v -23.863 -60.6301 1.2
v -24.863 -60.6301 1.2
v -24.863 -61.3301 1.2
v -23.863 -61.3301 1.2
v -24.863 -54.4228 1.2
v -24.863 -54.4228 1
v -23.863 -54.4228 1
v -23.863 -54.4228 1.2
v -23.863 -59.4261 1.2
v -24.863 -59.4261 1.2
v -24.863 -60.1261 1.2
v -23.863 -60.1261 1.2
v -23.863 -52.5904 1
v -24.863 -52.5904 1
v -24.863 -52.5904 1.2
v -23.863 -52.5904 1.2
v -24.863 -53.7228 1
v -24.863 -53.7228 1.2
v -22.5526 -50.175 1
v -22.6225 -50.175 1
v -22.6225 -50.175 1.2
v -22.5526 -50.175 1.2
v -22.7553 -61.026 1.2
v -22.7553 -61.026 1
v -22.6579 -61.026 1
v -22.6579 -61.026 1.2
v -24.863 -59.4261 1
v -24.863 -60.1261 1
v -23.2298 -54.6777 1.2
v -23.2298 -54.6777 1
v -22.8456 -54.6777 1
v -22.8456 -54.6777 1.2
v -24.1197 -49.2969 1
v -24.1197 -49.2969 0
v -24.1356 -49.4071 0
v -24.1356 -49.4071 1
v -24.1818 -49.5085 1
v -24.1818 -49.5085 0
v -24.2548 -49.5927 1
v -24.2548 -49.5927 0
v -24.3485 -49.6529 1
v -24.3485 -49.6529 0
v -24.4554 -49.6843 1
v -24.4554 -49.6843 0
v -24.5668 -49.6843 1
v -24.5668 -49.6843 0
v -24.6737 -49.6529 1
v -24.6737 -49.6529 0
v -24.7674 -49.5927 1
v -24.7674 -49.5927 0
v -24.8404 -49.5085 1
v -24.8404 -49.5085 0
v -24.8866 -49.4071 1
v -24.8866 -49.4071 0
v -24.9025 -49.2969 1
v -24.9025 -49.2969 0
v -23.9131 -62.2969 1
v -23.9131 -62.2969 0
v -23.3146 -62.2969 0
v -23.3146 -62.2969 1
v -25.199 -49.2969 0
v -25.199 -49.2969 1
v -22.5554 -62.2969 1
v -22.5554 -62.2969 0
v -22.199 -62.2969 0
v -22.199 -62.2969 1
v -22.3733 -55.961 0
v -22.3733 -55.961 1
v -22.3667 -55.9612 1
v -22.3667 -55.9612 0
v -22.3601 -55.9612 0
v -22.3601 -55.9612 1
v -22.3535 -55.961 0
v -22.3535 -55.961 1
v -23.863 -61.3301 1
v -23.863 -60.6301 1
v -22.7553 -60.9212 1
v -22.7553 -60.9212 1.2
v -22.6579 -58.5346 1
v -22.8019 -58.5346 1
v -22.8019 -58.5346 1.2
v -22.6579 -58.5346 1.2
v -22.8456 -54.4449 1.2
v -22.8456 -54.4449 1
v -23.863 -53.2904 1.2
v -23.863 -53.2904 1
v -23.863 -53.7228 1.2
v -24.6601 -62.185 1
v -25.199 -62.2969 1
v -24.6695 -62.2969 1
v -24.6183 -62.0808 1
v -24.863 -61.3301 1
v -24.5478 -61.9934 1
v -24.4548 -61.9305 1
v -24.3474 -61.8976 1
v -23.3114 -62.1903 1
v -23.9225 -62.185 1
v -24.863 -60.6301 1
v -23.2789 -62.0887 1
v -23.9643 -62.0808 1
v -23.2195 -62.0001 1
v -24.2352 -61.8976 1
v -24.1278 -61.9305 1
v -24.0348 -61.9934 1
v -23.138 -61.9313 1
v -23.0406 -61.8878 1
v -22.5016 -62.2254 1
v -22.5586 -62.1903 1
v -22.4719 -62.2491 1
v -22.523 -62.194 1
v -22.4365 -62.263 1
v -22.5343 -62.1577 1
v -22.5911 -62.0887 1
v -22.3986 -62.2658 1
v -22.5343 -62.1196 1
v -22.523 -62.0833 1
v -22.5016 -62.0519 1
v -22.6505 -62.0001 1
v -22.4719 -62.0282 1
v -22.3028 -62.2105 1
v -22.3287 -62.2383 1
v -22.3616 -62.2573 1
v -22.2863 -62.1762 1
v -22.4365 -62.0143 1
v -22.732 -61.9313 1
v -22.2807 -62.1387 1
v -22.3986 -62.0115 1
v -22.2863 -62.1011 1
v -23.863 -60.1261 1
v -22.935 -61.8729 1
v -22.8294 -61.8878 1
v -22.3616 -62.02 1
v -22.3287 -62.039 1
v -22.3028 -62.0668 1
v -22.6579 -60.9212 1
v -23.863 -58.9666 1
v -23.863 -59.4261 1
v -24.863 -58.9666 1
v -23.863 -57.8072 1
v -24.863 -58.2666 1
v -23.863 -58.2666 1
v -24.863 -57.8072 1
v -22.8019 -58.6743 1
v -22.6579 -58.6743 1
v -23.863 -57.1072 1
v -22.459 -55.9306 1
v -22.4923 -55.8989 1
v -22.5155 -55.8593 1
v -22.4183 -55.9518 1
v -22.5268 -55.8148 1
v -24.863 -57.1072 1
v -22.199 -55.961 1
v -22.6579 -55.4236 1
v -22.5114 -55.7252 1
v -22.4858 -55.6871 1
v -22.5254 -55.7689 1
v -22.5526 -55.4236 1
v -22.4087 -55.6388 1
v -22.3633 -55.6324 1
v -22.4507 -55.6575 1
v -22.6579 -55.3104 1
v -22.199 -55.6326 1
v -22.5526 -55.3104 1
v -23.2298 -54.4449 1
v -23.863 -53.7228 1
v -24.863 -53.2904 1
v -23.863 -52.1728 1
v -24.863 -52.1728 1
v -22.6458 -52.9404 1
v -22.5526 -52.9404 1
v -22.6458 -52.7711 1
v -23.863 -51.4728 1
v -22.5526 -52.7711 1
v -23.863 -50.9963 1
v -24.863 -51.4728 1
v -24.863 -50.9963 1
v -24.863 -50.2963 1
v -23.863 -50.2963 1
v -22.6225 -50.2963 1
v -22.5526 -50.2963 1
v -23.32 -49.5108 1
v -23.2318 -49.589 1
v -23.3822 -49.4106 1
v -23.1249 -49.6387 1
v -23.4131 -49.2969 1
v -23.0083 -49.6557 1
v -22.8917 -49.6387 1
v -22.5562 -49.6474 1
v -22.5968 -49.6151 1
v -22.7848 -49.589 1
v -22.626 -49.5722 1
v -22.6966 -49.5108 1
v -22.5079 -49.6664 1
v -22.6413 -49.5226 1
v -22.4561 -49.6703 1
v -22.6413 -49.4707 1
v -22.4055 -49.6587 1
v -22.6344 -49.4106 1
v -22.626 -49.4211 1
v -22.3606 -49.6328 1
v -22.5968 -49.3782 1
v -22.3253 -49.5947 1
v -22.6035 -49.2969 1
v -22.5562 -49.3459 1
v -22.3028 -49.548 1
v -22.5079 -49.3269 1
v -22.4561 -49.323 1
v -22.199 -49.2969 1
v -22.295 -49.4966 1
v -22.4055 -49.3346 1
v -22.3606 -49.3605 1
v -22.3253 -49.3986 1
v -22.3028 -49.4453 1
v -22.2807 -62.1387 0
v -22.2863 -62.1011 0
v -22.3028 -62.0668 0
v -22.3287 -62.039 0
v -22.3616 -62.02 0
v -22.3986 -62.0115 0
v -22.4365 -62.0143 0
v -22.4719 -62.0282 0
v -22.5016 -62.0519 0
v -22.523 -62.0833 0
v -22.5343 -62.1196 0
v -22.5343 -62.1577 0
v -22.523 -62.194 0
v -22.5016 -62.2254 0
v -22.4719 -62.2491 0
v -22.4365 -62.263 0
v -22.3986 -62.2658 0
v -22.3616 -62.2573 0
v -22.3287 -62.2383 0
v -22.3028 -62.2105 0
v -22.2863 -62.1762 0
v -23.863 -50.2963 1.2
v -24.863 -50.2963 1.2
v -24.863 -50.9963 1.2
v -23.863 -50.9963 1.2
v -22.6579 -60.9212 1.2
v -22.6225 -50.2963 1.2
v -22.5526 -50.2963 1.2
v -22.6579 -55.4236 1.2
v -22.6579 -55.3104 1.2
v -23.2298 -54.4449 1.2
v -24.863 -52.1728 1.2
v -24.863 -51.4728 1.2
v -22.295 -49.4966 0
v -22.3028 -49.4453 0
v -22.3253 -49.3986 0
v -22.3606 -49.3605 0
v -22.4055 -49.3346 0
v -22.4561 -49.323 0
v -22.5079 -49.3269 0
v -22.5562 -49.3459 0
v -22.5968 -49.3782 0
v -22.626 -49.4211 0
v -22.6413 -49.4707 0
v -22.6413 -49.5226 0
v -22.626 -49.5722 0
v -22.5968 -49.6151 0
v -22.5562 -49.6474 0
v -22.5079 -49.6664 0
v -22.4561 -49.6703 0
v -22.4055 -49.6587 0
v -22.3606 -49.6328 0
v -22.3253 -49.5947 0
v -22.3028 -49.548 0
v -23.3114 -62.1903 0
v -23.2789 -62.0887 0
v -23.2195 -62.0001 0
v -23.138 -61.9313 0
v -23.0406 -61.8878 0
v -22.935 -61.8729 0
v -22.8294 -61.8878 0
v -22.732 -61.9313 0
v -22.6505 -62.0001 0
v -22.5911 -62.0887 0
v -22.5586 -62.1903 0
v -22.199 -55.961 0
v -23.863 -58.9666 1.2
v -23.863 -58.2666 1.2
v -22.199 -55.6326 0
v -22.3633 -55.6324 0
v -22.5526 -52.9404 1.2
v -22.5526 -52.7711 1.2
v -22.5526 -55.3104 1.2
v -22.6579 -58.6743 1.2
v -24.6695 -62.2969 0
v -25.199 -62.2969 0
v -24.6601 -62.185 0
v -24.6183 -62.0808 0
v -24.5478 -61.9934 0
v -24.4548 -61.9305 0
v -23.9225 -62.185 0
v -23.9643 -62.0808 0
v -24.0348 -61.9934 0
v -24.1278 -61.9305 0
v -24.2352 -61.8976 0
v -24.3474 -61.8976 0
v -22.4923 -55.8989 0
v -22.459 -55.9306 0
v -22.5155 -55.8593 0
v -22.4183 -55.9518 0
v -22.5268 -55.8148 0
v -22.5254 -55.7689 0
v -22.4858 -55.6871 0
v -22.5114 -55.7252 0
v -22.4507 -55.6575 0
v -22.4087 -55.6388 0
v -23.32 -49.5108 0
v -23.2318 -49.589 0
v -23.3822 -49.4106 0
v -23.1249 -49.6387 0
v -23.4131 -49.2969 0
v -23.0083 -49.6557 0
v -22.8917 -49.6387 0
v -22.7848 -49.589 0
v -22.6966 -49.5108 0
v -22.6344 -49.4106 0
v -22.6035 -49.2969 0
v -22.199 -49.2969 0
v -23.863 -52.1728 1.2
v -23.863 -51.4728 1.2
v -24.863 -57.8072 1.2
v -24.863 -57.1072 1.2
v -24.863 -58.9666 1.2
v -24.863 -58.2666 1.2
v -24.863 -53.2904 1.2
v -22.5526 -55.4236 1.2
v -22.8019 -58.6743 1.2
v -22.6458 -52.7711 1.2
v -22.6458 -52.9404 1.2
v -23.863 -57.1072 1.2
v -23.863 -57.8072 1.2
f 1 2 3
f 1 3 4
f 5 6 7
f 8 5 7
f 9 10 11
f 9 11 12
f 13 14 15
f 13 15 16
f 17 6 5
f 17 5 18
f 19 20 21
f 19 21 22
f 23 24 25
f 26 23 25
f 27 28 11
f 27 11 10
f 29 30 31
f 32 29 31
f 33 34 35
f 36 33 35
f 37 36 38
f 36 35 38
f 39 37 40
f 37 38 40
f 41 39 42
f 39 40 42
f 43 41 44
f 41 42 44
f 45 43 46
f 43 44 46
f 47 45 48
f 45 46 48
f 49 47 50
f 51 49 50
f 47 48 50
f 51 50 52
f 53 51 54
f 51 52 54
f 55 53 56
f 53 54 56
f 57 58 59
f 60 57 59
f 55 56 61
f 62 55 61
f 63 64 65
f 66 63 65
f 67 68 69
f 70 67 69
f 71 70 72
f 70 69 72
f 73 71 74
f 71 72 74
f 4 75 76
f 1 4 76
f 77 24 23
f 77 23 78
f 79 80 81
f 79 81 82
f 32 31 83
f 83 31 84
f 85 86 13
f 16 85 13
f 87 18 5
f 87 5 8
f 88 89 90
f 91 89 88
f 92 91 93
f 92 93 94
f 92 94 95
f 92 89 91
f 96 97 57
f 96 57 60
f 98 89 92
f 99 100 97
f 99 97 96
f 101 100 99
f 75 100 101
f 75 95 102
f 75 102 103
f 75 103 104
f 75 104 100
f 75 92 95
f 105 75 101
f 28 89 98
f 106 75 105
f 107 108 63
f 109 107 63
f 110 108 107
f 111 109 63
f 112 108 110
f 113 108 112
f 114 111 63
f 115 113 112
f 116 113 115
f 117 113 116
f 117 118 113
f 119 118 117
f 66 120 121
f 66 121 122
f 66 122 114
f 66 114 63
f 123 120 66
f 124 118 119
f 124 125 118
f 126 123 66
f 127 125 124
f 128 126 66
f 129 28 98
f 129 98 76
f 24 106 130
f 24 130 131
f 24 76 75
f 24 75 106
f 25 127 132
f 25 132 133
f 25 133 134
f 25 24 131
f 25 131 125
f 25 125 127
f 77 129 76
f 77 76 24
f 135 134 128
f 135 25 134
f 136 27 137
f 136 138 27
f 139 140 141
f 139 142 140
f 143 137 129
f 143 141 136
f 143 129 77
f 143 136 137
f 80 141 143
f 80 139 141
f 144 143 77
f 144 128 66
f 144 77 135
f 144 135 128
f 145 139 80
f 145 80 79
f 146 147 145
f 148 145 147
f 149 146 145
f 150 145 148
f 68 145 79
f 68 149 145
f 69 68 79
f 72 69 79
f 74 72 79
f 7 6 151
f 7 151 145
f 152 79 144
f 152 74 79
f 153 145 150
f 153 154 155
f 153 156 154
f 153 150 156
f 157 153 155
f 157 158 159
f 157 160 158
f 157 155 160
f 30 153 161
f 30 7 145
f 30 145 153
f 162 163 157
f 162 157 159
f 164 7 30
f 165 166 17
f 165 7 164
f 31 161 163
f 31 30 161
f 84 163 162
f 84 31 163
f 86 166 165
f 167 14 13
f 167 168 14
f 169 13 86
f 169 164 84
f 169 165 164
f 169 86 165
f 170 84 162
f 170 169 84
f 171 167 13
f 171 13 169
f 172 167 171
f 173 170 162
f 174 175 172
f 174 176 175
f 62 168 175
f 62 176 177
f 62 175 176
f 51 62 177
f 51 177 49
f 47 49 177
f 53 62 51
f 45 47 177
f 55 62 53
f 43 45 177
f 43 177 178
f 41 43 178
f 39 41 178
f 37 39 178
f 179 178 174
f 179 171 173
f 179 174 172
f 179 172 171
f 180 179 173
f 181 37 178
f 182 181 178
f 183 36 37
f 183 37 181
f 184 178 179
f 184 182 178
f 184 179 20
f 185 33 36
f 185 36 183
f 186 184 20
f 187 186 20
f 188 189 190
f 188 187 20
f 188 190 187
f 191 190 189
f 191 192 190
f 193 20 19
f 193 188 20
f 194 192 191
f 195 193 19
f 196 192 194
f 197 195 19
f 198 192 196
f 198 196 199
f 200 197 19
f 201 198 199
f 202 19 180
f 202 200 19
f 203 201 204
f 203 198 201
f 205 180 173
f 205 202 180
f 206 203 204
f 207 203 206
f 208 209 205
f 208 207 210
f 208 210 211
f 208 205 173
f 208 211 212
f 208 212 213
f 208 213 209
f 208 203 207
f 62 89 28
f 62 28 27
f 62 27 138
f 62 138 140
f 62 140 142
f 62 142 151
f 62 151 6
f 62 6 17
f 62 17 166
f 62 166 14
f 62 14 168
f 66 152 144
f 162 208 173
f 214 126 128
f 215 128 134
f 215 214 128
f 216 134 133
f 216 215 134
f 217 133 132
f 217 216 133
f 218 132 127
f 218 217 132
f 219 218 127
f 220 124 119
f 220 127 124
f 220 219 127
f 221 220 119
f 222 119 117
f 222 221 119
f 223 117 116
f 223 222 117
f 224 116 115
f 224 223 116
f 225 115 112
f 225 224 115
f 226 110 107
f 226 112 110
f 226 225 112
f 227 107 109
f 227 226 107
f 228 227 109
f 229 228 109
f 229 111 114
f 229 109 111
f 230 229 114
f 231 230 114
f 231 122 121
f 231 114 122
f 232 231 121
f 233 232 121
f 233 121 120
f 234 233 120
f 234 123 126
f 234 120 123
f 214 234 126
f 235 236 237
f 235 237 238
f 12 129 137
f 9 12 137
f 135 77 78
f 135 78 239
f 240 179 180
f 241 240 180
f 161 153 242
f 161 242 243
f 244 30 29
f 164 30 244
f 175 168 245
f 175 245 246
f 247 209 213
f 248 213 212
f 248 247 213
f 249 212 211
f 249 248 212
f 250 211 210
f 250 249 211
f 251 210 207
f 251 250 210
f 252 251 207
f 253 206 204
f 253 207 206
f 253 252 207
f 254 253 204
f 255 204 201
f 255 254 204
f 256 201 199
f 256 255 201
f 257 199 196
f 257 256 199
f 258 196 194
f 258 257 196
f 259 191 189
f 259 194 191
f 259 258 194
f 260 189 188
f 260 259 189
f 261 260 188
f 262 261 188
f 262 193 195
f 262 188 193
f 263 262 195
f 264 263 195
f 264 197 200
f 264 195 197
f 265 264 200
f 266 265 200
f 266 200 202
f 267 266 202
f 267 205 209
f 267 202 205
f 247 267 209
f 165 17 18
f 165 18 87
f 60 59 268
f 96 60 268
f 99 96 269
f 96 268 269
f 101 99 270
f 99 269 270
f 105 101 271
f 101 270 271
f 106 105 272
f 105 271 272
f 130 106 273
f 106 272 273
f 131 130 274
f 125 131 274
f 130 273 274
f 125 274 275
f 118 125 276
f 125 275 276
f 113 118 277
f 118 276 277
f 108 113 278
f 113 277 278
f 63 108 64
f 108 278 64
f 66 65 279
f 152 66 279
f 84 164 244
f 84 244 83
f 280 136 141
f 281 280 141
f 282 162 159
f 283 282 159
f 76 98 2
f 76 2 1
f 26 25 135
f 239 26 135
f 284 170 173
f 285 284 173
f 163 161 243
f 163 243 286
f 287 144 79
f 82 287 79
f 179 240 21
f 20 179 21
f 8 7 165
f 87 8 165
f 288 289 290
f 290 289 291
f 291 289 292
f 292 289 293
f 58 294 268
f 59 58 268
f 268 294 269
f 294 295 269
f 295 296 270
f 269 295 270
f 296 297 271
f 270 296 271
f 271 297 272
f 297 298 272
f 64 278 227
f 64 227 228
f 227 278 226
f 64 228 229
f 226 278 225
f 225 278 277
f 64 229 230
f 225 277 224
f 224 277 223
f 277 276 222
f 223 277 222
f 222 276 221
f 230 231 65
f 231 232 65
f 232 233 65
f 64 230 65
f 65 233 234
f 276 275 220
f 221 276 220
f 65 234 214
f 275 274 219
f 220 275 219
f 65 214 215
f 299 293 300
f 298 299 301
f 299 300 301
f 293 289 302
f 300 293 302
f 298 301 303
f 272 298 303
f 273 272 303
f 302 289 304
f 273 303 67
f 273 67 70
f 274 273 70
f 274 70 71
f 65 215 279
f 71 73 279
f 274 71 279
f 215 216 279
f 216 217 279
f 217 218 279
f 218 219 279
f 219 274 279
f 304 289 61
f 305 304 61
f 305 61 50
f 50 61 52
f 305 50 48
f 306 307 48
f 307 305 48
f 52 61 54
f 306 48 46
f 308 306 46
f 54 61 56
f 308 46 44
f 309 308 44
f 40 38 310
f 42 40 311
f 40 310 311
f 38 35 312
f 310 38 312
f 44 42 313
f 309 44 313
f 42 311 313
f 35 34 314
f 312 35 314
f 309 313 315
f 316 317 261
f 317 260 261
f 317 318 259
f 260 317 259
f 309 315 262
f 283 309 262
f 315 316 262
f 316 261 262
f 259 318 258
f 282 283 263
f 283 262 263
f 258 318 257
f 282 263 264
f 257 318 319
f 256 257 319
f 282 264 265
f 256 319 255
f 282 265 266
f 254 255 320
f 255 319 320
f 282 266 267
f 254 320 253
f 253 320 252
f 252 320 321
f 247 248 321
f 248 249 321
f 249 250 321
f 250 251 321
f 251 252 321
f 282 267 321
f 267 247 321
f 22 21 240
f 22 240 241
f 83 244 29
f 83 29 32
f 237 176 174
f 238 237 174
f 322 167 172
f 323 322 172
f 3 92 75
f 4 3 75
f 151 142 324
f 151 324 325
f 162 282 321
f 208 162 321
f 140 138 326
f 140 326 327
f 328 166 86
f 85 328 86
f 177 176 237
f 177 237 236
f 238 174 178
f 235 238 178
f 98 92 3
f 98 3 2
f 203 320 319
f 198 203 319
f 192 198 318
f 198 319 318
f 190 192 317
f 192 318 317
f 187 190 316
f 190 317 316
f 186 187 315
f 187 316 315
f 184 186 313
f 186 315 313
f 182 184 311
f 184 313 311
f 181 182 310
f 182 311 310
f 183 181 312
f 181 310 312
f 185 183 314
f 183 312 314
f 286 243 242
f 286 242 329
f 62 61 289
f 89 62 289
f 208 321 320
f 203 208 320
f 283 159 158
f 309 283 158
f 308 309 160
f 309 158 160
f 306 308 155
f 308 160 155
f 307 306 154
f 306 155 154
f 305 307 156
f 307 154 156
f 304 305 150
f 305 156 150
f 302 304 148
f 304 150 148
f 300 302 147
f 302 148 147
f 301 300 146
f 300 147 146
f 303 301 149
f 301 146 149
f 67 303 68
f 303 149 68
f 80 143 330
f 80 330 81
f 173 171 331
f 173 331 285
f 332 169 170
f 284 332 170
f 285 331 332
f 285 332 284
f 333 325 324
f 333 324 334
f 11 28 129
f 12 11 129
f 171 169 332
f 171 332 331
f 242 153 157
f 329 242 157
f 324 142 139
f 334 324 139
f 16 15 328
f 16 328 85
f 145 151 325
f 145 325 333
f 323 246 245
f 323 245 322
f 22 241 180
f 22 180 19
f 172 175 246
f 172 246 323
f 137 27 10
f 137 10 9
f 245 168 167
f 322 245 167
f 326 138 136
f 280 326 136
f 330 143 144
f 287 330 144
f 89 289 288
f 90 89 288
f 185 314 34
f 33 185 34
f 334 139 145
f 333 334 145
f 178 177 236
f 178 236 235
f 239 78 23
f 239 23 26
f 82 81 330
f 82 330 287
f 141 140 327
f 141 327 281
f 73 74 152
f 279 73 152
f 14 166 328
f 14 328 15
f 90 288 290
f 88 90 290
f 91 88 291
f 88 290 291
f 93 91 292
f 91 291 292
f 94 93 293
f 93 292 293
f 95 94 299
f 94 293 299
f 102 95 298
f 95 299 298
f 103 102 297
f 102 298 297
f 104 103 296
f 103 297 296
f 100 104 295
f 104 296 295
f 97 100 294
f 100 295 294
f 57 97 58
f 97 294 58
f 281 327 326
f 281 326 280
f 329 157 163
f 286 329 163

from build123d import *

# Parameters (mm, degrees)
F1_DEPTH = 1
F2_R     = 0.174096
F2_R_2   = 0.127508
F3_DEPTH = 1.001
F4_W     = 1
F4_H     = 0.7
F4_W_2   = 0.384185
F4_H_2   = 0.232839
F5_DEPTH = 0.2
F7_DEPTH = 1.001
F8_W     = 0.069853
F8_H     = 0.121337
F8_W_2   = 0.093136
F8_H_2   = 0.169292
F8_W_3   = 0.105232
F8_H_3   = 0.113234
F8_W_4   = 0.097446
F8_H_4   = 0.104777
F8_W_5   = 0.144014
F8_H_5   = 0.139706
F9_DEPTH = 0.2


with BuildPart() as f1:
    # F0 (on Top) → F1 (new body)
    with BuildSketch(Plane.XY):
        with BuildLine():
            Line((-24.902489, -49.29686), (-25.199003, -49.29686))
            Line((-25.199003, -49.29686), (-25.199003, -62.29686))
            Line((-25.199003, -62.29686), (-24.669482, -62.29686))
            ThreePointArc((-24.669482, -62.29686), (-24.2913, -61.893387), (-23.913119, -62.29686))
            Line((-23.913119, -62.29686), (-23.314611, -62.29686))
            ThreePointArc((-23.314611, -62.29686), (-22.93501, -61.872911), (-22.55541, -62.29686))
            Line((-22.55541, -62.29686), (-22.199003, -62.29686))
            Line((-22.199003, -62.29686), (-22.199003, -49.29686))
            Line((-22.199003, -49.29686), (-22.603517, -49.29686))
            ThreePointArc((-22.603517, -49.29686), (-23.008304, -49.655694), (-23.41309, -49.29686))
            Line((-23.41309, -49.29686), (-24.119699, -49.29686))
            ThreePointArc((-24.119699, -49.29686), (-24.511094, -49.688254), (-24.902489, -49.29686))
        make_face()
    extrude(amount=F1_DEPTH)

    # F2 (on Top) → F3 (cut, through all)
    with BuildSketch(Plane.XY):
        with Locations((-22.469135, -49.496643)):
            Circle(F2_R)
        with Locations((-22.408167, -62.138651)):
            Circle(F2_R_2)
    extrude(amount=F3_DEPTH, mode=Mode.SUBTRACT)

    # F4 (on face) → F5 (join)
    with BuildSketch(Plane.XY.offset(1)):
        with Locations((-24.362976, -50.646318)):
            Rectangle(F4_W, F4_H)
        with Locations((-24.362976, -51.822787)):
            Rectangle(F4_W, F4_H)
        with Locations((-24.362976, -52.940436)):
            Rectangle(F4_W, F4_H)
        with Locations((-24.362976, -54.072786)):
            Rectangle(F4_W, F4_H)
        with Locations((-23.037707, -54.56131)):
            Rectangle(F4_W_2, F4_H_2)
        with Locations((-24.362976, -60.980084)):
            Rectangle(F4_W, F4_H)
        with Locations((-24.362976, -59.776055)):
            Rectangle(F4_W, F4_H)
        with Locations((-24.362976, -58.616622)):
            Rectangle(F4_W, F4_H)
        with Locations((-24.362976, -57.457188)):
            Rectangle(F4_W, F4_H)
    extrude(amount=F5_DEPTH)

    # F6 (on face) → F7 (cut, through all)
    with BuildSketch(Plane.XY.offset(1)):
        with BuildLine():
            Line((-22.353487, -55.96097), (-22.373339, -55.96097))
            ThreePointArc((-22.373339, -55.96097), (-22.363413, -55.96127), (-22.353487, -55.96097))
        make_face()
        with BuildLine():
            Line((-22.199003, -55.63259), (-22.363273, -55.63245))
            ThreePointArc((-22.363273, -55.63245), (-22.527746, -55.791824), (-22.373339, -55.96097))
            Line((-22.373339, -55.96097), (-22.353487, -55.96097))
            Line((-22.353487, -55.96097), (-22.199003, -55.96097))
            Line((-22.199003, -55.96097), (-22.199003, -55.63259))
        make_face()
    extrude(amount=-F7_DEPTH, mode=Mode.SUBTRACT)

    # F8 (on face) → F9 (join)
    with BuildSketch(Plane.XY.offset(1)):
        with Locations((-22.587573, -50.235649)):
            Rectangle(F8_W, F8_H)
        with Locations((-22.599215, -52.85579)):
            Rectangle(F8_W_2, F8_H_2)
        with Locations((-22.605263, -55.366989)):
            Rectangle(F8_W_3, F8_H_3)
        with Locations((-22.706602, -60.973562)):
            Rectangle(F8_W_4, F8_H_4)
        with Locations((-22.729886, -58.604419)):
            Rectangle(F8_W_5, F8_H_5)
    extrude(amount=F9_DEPTH)


solid = f1.part
